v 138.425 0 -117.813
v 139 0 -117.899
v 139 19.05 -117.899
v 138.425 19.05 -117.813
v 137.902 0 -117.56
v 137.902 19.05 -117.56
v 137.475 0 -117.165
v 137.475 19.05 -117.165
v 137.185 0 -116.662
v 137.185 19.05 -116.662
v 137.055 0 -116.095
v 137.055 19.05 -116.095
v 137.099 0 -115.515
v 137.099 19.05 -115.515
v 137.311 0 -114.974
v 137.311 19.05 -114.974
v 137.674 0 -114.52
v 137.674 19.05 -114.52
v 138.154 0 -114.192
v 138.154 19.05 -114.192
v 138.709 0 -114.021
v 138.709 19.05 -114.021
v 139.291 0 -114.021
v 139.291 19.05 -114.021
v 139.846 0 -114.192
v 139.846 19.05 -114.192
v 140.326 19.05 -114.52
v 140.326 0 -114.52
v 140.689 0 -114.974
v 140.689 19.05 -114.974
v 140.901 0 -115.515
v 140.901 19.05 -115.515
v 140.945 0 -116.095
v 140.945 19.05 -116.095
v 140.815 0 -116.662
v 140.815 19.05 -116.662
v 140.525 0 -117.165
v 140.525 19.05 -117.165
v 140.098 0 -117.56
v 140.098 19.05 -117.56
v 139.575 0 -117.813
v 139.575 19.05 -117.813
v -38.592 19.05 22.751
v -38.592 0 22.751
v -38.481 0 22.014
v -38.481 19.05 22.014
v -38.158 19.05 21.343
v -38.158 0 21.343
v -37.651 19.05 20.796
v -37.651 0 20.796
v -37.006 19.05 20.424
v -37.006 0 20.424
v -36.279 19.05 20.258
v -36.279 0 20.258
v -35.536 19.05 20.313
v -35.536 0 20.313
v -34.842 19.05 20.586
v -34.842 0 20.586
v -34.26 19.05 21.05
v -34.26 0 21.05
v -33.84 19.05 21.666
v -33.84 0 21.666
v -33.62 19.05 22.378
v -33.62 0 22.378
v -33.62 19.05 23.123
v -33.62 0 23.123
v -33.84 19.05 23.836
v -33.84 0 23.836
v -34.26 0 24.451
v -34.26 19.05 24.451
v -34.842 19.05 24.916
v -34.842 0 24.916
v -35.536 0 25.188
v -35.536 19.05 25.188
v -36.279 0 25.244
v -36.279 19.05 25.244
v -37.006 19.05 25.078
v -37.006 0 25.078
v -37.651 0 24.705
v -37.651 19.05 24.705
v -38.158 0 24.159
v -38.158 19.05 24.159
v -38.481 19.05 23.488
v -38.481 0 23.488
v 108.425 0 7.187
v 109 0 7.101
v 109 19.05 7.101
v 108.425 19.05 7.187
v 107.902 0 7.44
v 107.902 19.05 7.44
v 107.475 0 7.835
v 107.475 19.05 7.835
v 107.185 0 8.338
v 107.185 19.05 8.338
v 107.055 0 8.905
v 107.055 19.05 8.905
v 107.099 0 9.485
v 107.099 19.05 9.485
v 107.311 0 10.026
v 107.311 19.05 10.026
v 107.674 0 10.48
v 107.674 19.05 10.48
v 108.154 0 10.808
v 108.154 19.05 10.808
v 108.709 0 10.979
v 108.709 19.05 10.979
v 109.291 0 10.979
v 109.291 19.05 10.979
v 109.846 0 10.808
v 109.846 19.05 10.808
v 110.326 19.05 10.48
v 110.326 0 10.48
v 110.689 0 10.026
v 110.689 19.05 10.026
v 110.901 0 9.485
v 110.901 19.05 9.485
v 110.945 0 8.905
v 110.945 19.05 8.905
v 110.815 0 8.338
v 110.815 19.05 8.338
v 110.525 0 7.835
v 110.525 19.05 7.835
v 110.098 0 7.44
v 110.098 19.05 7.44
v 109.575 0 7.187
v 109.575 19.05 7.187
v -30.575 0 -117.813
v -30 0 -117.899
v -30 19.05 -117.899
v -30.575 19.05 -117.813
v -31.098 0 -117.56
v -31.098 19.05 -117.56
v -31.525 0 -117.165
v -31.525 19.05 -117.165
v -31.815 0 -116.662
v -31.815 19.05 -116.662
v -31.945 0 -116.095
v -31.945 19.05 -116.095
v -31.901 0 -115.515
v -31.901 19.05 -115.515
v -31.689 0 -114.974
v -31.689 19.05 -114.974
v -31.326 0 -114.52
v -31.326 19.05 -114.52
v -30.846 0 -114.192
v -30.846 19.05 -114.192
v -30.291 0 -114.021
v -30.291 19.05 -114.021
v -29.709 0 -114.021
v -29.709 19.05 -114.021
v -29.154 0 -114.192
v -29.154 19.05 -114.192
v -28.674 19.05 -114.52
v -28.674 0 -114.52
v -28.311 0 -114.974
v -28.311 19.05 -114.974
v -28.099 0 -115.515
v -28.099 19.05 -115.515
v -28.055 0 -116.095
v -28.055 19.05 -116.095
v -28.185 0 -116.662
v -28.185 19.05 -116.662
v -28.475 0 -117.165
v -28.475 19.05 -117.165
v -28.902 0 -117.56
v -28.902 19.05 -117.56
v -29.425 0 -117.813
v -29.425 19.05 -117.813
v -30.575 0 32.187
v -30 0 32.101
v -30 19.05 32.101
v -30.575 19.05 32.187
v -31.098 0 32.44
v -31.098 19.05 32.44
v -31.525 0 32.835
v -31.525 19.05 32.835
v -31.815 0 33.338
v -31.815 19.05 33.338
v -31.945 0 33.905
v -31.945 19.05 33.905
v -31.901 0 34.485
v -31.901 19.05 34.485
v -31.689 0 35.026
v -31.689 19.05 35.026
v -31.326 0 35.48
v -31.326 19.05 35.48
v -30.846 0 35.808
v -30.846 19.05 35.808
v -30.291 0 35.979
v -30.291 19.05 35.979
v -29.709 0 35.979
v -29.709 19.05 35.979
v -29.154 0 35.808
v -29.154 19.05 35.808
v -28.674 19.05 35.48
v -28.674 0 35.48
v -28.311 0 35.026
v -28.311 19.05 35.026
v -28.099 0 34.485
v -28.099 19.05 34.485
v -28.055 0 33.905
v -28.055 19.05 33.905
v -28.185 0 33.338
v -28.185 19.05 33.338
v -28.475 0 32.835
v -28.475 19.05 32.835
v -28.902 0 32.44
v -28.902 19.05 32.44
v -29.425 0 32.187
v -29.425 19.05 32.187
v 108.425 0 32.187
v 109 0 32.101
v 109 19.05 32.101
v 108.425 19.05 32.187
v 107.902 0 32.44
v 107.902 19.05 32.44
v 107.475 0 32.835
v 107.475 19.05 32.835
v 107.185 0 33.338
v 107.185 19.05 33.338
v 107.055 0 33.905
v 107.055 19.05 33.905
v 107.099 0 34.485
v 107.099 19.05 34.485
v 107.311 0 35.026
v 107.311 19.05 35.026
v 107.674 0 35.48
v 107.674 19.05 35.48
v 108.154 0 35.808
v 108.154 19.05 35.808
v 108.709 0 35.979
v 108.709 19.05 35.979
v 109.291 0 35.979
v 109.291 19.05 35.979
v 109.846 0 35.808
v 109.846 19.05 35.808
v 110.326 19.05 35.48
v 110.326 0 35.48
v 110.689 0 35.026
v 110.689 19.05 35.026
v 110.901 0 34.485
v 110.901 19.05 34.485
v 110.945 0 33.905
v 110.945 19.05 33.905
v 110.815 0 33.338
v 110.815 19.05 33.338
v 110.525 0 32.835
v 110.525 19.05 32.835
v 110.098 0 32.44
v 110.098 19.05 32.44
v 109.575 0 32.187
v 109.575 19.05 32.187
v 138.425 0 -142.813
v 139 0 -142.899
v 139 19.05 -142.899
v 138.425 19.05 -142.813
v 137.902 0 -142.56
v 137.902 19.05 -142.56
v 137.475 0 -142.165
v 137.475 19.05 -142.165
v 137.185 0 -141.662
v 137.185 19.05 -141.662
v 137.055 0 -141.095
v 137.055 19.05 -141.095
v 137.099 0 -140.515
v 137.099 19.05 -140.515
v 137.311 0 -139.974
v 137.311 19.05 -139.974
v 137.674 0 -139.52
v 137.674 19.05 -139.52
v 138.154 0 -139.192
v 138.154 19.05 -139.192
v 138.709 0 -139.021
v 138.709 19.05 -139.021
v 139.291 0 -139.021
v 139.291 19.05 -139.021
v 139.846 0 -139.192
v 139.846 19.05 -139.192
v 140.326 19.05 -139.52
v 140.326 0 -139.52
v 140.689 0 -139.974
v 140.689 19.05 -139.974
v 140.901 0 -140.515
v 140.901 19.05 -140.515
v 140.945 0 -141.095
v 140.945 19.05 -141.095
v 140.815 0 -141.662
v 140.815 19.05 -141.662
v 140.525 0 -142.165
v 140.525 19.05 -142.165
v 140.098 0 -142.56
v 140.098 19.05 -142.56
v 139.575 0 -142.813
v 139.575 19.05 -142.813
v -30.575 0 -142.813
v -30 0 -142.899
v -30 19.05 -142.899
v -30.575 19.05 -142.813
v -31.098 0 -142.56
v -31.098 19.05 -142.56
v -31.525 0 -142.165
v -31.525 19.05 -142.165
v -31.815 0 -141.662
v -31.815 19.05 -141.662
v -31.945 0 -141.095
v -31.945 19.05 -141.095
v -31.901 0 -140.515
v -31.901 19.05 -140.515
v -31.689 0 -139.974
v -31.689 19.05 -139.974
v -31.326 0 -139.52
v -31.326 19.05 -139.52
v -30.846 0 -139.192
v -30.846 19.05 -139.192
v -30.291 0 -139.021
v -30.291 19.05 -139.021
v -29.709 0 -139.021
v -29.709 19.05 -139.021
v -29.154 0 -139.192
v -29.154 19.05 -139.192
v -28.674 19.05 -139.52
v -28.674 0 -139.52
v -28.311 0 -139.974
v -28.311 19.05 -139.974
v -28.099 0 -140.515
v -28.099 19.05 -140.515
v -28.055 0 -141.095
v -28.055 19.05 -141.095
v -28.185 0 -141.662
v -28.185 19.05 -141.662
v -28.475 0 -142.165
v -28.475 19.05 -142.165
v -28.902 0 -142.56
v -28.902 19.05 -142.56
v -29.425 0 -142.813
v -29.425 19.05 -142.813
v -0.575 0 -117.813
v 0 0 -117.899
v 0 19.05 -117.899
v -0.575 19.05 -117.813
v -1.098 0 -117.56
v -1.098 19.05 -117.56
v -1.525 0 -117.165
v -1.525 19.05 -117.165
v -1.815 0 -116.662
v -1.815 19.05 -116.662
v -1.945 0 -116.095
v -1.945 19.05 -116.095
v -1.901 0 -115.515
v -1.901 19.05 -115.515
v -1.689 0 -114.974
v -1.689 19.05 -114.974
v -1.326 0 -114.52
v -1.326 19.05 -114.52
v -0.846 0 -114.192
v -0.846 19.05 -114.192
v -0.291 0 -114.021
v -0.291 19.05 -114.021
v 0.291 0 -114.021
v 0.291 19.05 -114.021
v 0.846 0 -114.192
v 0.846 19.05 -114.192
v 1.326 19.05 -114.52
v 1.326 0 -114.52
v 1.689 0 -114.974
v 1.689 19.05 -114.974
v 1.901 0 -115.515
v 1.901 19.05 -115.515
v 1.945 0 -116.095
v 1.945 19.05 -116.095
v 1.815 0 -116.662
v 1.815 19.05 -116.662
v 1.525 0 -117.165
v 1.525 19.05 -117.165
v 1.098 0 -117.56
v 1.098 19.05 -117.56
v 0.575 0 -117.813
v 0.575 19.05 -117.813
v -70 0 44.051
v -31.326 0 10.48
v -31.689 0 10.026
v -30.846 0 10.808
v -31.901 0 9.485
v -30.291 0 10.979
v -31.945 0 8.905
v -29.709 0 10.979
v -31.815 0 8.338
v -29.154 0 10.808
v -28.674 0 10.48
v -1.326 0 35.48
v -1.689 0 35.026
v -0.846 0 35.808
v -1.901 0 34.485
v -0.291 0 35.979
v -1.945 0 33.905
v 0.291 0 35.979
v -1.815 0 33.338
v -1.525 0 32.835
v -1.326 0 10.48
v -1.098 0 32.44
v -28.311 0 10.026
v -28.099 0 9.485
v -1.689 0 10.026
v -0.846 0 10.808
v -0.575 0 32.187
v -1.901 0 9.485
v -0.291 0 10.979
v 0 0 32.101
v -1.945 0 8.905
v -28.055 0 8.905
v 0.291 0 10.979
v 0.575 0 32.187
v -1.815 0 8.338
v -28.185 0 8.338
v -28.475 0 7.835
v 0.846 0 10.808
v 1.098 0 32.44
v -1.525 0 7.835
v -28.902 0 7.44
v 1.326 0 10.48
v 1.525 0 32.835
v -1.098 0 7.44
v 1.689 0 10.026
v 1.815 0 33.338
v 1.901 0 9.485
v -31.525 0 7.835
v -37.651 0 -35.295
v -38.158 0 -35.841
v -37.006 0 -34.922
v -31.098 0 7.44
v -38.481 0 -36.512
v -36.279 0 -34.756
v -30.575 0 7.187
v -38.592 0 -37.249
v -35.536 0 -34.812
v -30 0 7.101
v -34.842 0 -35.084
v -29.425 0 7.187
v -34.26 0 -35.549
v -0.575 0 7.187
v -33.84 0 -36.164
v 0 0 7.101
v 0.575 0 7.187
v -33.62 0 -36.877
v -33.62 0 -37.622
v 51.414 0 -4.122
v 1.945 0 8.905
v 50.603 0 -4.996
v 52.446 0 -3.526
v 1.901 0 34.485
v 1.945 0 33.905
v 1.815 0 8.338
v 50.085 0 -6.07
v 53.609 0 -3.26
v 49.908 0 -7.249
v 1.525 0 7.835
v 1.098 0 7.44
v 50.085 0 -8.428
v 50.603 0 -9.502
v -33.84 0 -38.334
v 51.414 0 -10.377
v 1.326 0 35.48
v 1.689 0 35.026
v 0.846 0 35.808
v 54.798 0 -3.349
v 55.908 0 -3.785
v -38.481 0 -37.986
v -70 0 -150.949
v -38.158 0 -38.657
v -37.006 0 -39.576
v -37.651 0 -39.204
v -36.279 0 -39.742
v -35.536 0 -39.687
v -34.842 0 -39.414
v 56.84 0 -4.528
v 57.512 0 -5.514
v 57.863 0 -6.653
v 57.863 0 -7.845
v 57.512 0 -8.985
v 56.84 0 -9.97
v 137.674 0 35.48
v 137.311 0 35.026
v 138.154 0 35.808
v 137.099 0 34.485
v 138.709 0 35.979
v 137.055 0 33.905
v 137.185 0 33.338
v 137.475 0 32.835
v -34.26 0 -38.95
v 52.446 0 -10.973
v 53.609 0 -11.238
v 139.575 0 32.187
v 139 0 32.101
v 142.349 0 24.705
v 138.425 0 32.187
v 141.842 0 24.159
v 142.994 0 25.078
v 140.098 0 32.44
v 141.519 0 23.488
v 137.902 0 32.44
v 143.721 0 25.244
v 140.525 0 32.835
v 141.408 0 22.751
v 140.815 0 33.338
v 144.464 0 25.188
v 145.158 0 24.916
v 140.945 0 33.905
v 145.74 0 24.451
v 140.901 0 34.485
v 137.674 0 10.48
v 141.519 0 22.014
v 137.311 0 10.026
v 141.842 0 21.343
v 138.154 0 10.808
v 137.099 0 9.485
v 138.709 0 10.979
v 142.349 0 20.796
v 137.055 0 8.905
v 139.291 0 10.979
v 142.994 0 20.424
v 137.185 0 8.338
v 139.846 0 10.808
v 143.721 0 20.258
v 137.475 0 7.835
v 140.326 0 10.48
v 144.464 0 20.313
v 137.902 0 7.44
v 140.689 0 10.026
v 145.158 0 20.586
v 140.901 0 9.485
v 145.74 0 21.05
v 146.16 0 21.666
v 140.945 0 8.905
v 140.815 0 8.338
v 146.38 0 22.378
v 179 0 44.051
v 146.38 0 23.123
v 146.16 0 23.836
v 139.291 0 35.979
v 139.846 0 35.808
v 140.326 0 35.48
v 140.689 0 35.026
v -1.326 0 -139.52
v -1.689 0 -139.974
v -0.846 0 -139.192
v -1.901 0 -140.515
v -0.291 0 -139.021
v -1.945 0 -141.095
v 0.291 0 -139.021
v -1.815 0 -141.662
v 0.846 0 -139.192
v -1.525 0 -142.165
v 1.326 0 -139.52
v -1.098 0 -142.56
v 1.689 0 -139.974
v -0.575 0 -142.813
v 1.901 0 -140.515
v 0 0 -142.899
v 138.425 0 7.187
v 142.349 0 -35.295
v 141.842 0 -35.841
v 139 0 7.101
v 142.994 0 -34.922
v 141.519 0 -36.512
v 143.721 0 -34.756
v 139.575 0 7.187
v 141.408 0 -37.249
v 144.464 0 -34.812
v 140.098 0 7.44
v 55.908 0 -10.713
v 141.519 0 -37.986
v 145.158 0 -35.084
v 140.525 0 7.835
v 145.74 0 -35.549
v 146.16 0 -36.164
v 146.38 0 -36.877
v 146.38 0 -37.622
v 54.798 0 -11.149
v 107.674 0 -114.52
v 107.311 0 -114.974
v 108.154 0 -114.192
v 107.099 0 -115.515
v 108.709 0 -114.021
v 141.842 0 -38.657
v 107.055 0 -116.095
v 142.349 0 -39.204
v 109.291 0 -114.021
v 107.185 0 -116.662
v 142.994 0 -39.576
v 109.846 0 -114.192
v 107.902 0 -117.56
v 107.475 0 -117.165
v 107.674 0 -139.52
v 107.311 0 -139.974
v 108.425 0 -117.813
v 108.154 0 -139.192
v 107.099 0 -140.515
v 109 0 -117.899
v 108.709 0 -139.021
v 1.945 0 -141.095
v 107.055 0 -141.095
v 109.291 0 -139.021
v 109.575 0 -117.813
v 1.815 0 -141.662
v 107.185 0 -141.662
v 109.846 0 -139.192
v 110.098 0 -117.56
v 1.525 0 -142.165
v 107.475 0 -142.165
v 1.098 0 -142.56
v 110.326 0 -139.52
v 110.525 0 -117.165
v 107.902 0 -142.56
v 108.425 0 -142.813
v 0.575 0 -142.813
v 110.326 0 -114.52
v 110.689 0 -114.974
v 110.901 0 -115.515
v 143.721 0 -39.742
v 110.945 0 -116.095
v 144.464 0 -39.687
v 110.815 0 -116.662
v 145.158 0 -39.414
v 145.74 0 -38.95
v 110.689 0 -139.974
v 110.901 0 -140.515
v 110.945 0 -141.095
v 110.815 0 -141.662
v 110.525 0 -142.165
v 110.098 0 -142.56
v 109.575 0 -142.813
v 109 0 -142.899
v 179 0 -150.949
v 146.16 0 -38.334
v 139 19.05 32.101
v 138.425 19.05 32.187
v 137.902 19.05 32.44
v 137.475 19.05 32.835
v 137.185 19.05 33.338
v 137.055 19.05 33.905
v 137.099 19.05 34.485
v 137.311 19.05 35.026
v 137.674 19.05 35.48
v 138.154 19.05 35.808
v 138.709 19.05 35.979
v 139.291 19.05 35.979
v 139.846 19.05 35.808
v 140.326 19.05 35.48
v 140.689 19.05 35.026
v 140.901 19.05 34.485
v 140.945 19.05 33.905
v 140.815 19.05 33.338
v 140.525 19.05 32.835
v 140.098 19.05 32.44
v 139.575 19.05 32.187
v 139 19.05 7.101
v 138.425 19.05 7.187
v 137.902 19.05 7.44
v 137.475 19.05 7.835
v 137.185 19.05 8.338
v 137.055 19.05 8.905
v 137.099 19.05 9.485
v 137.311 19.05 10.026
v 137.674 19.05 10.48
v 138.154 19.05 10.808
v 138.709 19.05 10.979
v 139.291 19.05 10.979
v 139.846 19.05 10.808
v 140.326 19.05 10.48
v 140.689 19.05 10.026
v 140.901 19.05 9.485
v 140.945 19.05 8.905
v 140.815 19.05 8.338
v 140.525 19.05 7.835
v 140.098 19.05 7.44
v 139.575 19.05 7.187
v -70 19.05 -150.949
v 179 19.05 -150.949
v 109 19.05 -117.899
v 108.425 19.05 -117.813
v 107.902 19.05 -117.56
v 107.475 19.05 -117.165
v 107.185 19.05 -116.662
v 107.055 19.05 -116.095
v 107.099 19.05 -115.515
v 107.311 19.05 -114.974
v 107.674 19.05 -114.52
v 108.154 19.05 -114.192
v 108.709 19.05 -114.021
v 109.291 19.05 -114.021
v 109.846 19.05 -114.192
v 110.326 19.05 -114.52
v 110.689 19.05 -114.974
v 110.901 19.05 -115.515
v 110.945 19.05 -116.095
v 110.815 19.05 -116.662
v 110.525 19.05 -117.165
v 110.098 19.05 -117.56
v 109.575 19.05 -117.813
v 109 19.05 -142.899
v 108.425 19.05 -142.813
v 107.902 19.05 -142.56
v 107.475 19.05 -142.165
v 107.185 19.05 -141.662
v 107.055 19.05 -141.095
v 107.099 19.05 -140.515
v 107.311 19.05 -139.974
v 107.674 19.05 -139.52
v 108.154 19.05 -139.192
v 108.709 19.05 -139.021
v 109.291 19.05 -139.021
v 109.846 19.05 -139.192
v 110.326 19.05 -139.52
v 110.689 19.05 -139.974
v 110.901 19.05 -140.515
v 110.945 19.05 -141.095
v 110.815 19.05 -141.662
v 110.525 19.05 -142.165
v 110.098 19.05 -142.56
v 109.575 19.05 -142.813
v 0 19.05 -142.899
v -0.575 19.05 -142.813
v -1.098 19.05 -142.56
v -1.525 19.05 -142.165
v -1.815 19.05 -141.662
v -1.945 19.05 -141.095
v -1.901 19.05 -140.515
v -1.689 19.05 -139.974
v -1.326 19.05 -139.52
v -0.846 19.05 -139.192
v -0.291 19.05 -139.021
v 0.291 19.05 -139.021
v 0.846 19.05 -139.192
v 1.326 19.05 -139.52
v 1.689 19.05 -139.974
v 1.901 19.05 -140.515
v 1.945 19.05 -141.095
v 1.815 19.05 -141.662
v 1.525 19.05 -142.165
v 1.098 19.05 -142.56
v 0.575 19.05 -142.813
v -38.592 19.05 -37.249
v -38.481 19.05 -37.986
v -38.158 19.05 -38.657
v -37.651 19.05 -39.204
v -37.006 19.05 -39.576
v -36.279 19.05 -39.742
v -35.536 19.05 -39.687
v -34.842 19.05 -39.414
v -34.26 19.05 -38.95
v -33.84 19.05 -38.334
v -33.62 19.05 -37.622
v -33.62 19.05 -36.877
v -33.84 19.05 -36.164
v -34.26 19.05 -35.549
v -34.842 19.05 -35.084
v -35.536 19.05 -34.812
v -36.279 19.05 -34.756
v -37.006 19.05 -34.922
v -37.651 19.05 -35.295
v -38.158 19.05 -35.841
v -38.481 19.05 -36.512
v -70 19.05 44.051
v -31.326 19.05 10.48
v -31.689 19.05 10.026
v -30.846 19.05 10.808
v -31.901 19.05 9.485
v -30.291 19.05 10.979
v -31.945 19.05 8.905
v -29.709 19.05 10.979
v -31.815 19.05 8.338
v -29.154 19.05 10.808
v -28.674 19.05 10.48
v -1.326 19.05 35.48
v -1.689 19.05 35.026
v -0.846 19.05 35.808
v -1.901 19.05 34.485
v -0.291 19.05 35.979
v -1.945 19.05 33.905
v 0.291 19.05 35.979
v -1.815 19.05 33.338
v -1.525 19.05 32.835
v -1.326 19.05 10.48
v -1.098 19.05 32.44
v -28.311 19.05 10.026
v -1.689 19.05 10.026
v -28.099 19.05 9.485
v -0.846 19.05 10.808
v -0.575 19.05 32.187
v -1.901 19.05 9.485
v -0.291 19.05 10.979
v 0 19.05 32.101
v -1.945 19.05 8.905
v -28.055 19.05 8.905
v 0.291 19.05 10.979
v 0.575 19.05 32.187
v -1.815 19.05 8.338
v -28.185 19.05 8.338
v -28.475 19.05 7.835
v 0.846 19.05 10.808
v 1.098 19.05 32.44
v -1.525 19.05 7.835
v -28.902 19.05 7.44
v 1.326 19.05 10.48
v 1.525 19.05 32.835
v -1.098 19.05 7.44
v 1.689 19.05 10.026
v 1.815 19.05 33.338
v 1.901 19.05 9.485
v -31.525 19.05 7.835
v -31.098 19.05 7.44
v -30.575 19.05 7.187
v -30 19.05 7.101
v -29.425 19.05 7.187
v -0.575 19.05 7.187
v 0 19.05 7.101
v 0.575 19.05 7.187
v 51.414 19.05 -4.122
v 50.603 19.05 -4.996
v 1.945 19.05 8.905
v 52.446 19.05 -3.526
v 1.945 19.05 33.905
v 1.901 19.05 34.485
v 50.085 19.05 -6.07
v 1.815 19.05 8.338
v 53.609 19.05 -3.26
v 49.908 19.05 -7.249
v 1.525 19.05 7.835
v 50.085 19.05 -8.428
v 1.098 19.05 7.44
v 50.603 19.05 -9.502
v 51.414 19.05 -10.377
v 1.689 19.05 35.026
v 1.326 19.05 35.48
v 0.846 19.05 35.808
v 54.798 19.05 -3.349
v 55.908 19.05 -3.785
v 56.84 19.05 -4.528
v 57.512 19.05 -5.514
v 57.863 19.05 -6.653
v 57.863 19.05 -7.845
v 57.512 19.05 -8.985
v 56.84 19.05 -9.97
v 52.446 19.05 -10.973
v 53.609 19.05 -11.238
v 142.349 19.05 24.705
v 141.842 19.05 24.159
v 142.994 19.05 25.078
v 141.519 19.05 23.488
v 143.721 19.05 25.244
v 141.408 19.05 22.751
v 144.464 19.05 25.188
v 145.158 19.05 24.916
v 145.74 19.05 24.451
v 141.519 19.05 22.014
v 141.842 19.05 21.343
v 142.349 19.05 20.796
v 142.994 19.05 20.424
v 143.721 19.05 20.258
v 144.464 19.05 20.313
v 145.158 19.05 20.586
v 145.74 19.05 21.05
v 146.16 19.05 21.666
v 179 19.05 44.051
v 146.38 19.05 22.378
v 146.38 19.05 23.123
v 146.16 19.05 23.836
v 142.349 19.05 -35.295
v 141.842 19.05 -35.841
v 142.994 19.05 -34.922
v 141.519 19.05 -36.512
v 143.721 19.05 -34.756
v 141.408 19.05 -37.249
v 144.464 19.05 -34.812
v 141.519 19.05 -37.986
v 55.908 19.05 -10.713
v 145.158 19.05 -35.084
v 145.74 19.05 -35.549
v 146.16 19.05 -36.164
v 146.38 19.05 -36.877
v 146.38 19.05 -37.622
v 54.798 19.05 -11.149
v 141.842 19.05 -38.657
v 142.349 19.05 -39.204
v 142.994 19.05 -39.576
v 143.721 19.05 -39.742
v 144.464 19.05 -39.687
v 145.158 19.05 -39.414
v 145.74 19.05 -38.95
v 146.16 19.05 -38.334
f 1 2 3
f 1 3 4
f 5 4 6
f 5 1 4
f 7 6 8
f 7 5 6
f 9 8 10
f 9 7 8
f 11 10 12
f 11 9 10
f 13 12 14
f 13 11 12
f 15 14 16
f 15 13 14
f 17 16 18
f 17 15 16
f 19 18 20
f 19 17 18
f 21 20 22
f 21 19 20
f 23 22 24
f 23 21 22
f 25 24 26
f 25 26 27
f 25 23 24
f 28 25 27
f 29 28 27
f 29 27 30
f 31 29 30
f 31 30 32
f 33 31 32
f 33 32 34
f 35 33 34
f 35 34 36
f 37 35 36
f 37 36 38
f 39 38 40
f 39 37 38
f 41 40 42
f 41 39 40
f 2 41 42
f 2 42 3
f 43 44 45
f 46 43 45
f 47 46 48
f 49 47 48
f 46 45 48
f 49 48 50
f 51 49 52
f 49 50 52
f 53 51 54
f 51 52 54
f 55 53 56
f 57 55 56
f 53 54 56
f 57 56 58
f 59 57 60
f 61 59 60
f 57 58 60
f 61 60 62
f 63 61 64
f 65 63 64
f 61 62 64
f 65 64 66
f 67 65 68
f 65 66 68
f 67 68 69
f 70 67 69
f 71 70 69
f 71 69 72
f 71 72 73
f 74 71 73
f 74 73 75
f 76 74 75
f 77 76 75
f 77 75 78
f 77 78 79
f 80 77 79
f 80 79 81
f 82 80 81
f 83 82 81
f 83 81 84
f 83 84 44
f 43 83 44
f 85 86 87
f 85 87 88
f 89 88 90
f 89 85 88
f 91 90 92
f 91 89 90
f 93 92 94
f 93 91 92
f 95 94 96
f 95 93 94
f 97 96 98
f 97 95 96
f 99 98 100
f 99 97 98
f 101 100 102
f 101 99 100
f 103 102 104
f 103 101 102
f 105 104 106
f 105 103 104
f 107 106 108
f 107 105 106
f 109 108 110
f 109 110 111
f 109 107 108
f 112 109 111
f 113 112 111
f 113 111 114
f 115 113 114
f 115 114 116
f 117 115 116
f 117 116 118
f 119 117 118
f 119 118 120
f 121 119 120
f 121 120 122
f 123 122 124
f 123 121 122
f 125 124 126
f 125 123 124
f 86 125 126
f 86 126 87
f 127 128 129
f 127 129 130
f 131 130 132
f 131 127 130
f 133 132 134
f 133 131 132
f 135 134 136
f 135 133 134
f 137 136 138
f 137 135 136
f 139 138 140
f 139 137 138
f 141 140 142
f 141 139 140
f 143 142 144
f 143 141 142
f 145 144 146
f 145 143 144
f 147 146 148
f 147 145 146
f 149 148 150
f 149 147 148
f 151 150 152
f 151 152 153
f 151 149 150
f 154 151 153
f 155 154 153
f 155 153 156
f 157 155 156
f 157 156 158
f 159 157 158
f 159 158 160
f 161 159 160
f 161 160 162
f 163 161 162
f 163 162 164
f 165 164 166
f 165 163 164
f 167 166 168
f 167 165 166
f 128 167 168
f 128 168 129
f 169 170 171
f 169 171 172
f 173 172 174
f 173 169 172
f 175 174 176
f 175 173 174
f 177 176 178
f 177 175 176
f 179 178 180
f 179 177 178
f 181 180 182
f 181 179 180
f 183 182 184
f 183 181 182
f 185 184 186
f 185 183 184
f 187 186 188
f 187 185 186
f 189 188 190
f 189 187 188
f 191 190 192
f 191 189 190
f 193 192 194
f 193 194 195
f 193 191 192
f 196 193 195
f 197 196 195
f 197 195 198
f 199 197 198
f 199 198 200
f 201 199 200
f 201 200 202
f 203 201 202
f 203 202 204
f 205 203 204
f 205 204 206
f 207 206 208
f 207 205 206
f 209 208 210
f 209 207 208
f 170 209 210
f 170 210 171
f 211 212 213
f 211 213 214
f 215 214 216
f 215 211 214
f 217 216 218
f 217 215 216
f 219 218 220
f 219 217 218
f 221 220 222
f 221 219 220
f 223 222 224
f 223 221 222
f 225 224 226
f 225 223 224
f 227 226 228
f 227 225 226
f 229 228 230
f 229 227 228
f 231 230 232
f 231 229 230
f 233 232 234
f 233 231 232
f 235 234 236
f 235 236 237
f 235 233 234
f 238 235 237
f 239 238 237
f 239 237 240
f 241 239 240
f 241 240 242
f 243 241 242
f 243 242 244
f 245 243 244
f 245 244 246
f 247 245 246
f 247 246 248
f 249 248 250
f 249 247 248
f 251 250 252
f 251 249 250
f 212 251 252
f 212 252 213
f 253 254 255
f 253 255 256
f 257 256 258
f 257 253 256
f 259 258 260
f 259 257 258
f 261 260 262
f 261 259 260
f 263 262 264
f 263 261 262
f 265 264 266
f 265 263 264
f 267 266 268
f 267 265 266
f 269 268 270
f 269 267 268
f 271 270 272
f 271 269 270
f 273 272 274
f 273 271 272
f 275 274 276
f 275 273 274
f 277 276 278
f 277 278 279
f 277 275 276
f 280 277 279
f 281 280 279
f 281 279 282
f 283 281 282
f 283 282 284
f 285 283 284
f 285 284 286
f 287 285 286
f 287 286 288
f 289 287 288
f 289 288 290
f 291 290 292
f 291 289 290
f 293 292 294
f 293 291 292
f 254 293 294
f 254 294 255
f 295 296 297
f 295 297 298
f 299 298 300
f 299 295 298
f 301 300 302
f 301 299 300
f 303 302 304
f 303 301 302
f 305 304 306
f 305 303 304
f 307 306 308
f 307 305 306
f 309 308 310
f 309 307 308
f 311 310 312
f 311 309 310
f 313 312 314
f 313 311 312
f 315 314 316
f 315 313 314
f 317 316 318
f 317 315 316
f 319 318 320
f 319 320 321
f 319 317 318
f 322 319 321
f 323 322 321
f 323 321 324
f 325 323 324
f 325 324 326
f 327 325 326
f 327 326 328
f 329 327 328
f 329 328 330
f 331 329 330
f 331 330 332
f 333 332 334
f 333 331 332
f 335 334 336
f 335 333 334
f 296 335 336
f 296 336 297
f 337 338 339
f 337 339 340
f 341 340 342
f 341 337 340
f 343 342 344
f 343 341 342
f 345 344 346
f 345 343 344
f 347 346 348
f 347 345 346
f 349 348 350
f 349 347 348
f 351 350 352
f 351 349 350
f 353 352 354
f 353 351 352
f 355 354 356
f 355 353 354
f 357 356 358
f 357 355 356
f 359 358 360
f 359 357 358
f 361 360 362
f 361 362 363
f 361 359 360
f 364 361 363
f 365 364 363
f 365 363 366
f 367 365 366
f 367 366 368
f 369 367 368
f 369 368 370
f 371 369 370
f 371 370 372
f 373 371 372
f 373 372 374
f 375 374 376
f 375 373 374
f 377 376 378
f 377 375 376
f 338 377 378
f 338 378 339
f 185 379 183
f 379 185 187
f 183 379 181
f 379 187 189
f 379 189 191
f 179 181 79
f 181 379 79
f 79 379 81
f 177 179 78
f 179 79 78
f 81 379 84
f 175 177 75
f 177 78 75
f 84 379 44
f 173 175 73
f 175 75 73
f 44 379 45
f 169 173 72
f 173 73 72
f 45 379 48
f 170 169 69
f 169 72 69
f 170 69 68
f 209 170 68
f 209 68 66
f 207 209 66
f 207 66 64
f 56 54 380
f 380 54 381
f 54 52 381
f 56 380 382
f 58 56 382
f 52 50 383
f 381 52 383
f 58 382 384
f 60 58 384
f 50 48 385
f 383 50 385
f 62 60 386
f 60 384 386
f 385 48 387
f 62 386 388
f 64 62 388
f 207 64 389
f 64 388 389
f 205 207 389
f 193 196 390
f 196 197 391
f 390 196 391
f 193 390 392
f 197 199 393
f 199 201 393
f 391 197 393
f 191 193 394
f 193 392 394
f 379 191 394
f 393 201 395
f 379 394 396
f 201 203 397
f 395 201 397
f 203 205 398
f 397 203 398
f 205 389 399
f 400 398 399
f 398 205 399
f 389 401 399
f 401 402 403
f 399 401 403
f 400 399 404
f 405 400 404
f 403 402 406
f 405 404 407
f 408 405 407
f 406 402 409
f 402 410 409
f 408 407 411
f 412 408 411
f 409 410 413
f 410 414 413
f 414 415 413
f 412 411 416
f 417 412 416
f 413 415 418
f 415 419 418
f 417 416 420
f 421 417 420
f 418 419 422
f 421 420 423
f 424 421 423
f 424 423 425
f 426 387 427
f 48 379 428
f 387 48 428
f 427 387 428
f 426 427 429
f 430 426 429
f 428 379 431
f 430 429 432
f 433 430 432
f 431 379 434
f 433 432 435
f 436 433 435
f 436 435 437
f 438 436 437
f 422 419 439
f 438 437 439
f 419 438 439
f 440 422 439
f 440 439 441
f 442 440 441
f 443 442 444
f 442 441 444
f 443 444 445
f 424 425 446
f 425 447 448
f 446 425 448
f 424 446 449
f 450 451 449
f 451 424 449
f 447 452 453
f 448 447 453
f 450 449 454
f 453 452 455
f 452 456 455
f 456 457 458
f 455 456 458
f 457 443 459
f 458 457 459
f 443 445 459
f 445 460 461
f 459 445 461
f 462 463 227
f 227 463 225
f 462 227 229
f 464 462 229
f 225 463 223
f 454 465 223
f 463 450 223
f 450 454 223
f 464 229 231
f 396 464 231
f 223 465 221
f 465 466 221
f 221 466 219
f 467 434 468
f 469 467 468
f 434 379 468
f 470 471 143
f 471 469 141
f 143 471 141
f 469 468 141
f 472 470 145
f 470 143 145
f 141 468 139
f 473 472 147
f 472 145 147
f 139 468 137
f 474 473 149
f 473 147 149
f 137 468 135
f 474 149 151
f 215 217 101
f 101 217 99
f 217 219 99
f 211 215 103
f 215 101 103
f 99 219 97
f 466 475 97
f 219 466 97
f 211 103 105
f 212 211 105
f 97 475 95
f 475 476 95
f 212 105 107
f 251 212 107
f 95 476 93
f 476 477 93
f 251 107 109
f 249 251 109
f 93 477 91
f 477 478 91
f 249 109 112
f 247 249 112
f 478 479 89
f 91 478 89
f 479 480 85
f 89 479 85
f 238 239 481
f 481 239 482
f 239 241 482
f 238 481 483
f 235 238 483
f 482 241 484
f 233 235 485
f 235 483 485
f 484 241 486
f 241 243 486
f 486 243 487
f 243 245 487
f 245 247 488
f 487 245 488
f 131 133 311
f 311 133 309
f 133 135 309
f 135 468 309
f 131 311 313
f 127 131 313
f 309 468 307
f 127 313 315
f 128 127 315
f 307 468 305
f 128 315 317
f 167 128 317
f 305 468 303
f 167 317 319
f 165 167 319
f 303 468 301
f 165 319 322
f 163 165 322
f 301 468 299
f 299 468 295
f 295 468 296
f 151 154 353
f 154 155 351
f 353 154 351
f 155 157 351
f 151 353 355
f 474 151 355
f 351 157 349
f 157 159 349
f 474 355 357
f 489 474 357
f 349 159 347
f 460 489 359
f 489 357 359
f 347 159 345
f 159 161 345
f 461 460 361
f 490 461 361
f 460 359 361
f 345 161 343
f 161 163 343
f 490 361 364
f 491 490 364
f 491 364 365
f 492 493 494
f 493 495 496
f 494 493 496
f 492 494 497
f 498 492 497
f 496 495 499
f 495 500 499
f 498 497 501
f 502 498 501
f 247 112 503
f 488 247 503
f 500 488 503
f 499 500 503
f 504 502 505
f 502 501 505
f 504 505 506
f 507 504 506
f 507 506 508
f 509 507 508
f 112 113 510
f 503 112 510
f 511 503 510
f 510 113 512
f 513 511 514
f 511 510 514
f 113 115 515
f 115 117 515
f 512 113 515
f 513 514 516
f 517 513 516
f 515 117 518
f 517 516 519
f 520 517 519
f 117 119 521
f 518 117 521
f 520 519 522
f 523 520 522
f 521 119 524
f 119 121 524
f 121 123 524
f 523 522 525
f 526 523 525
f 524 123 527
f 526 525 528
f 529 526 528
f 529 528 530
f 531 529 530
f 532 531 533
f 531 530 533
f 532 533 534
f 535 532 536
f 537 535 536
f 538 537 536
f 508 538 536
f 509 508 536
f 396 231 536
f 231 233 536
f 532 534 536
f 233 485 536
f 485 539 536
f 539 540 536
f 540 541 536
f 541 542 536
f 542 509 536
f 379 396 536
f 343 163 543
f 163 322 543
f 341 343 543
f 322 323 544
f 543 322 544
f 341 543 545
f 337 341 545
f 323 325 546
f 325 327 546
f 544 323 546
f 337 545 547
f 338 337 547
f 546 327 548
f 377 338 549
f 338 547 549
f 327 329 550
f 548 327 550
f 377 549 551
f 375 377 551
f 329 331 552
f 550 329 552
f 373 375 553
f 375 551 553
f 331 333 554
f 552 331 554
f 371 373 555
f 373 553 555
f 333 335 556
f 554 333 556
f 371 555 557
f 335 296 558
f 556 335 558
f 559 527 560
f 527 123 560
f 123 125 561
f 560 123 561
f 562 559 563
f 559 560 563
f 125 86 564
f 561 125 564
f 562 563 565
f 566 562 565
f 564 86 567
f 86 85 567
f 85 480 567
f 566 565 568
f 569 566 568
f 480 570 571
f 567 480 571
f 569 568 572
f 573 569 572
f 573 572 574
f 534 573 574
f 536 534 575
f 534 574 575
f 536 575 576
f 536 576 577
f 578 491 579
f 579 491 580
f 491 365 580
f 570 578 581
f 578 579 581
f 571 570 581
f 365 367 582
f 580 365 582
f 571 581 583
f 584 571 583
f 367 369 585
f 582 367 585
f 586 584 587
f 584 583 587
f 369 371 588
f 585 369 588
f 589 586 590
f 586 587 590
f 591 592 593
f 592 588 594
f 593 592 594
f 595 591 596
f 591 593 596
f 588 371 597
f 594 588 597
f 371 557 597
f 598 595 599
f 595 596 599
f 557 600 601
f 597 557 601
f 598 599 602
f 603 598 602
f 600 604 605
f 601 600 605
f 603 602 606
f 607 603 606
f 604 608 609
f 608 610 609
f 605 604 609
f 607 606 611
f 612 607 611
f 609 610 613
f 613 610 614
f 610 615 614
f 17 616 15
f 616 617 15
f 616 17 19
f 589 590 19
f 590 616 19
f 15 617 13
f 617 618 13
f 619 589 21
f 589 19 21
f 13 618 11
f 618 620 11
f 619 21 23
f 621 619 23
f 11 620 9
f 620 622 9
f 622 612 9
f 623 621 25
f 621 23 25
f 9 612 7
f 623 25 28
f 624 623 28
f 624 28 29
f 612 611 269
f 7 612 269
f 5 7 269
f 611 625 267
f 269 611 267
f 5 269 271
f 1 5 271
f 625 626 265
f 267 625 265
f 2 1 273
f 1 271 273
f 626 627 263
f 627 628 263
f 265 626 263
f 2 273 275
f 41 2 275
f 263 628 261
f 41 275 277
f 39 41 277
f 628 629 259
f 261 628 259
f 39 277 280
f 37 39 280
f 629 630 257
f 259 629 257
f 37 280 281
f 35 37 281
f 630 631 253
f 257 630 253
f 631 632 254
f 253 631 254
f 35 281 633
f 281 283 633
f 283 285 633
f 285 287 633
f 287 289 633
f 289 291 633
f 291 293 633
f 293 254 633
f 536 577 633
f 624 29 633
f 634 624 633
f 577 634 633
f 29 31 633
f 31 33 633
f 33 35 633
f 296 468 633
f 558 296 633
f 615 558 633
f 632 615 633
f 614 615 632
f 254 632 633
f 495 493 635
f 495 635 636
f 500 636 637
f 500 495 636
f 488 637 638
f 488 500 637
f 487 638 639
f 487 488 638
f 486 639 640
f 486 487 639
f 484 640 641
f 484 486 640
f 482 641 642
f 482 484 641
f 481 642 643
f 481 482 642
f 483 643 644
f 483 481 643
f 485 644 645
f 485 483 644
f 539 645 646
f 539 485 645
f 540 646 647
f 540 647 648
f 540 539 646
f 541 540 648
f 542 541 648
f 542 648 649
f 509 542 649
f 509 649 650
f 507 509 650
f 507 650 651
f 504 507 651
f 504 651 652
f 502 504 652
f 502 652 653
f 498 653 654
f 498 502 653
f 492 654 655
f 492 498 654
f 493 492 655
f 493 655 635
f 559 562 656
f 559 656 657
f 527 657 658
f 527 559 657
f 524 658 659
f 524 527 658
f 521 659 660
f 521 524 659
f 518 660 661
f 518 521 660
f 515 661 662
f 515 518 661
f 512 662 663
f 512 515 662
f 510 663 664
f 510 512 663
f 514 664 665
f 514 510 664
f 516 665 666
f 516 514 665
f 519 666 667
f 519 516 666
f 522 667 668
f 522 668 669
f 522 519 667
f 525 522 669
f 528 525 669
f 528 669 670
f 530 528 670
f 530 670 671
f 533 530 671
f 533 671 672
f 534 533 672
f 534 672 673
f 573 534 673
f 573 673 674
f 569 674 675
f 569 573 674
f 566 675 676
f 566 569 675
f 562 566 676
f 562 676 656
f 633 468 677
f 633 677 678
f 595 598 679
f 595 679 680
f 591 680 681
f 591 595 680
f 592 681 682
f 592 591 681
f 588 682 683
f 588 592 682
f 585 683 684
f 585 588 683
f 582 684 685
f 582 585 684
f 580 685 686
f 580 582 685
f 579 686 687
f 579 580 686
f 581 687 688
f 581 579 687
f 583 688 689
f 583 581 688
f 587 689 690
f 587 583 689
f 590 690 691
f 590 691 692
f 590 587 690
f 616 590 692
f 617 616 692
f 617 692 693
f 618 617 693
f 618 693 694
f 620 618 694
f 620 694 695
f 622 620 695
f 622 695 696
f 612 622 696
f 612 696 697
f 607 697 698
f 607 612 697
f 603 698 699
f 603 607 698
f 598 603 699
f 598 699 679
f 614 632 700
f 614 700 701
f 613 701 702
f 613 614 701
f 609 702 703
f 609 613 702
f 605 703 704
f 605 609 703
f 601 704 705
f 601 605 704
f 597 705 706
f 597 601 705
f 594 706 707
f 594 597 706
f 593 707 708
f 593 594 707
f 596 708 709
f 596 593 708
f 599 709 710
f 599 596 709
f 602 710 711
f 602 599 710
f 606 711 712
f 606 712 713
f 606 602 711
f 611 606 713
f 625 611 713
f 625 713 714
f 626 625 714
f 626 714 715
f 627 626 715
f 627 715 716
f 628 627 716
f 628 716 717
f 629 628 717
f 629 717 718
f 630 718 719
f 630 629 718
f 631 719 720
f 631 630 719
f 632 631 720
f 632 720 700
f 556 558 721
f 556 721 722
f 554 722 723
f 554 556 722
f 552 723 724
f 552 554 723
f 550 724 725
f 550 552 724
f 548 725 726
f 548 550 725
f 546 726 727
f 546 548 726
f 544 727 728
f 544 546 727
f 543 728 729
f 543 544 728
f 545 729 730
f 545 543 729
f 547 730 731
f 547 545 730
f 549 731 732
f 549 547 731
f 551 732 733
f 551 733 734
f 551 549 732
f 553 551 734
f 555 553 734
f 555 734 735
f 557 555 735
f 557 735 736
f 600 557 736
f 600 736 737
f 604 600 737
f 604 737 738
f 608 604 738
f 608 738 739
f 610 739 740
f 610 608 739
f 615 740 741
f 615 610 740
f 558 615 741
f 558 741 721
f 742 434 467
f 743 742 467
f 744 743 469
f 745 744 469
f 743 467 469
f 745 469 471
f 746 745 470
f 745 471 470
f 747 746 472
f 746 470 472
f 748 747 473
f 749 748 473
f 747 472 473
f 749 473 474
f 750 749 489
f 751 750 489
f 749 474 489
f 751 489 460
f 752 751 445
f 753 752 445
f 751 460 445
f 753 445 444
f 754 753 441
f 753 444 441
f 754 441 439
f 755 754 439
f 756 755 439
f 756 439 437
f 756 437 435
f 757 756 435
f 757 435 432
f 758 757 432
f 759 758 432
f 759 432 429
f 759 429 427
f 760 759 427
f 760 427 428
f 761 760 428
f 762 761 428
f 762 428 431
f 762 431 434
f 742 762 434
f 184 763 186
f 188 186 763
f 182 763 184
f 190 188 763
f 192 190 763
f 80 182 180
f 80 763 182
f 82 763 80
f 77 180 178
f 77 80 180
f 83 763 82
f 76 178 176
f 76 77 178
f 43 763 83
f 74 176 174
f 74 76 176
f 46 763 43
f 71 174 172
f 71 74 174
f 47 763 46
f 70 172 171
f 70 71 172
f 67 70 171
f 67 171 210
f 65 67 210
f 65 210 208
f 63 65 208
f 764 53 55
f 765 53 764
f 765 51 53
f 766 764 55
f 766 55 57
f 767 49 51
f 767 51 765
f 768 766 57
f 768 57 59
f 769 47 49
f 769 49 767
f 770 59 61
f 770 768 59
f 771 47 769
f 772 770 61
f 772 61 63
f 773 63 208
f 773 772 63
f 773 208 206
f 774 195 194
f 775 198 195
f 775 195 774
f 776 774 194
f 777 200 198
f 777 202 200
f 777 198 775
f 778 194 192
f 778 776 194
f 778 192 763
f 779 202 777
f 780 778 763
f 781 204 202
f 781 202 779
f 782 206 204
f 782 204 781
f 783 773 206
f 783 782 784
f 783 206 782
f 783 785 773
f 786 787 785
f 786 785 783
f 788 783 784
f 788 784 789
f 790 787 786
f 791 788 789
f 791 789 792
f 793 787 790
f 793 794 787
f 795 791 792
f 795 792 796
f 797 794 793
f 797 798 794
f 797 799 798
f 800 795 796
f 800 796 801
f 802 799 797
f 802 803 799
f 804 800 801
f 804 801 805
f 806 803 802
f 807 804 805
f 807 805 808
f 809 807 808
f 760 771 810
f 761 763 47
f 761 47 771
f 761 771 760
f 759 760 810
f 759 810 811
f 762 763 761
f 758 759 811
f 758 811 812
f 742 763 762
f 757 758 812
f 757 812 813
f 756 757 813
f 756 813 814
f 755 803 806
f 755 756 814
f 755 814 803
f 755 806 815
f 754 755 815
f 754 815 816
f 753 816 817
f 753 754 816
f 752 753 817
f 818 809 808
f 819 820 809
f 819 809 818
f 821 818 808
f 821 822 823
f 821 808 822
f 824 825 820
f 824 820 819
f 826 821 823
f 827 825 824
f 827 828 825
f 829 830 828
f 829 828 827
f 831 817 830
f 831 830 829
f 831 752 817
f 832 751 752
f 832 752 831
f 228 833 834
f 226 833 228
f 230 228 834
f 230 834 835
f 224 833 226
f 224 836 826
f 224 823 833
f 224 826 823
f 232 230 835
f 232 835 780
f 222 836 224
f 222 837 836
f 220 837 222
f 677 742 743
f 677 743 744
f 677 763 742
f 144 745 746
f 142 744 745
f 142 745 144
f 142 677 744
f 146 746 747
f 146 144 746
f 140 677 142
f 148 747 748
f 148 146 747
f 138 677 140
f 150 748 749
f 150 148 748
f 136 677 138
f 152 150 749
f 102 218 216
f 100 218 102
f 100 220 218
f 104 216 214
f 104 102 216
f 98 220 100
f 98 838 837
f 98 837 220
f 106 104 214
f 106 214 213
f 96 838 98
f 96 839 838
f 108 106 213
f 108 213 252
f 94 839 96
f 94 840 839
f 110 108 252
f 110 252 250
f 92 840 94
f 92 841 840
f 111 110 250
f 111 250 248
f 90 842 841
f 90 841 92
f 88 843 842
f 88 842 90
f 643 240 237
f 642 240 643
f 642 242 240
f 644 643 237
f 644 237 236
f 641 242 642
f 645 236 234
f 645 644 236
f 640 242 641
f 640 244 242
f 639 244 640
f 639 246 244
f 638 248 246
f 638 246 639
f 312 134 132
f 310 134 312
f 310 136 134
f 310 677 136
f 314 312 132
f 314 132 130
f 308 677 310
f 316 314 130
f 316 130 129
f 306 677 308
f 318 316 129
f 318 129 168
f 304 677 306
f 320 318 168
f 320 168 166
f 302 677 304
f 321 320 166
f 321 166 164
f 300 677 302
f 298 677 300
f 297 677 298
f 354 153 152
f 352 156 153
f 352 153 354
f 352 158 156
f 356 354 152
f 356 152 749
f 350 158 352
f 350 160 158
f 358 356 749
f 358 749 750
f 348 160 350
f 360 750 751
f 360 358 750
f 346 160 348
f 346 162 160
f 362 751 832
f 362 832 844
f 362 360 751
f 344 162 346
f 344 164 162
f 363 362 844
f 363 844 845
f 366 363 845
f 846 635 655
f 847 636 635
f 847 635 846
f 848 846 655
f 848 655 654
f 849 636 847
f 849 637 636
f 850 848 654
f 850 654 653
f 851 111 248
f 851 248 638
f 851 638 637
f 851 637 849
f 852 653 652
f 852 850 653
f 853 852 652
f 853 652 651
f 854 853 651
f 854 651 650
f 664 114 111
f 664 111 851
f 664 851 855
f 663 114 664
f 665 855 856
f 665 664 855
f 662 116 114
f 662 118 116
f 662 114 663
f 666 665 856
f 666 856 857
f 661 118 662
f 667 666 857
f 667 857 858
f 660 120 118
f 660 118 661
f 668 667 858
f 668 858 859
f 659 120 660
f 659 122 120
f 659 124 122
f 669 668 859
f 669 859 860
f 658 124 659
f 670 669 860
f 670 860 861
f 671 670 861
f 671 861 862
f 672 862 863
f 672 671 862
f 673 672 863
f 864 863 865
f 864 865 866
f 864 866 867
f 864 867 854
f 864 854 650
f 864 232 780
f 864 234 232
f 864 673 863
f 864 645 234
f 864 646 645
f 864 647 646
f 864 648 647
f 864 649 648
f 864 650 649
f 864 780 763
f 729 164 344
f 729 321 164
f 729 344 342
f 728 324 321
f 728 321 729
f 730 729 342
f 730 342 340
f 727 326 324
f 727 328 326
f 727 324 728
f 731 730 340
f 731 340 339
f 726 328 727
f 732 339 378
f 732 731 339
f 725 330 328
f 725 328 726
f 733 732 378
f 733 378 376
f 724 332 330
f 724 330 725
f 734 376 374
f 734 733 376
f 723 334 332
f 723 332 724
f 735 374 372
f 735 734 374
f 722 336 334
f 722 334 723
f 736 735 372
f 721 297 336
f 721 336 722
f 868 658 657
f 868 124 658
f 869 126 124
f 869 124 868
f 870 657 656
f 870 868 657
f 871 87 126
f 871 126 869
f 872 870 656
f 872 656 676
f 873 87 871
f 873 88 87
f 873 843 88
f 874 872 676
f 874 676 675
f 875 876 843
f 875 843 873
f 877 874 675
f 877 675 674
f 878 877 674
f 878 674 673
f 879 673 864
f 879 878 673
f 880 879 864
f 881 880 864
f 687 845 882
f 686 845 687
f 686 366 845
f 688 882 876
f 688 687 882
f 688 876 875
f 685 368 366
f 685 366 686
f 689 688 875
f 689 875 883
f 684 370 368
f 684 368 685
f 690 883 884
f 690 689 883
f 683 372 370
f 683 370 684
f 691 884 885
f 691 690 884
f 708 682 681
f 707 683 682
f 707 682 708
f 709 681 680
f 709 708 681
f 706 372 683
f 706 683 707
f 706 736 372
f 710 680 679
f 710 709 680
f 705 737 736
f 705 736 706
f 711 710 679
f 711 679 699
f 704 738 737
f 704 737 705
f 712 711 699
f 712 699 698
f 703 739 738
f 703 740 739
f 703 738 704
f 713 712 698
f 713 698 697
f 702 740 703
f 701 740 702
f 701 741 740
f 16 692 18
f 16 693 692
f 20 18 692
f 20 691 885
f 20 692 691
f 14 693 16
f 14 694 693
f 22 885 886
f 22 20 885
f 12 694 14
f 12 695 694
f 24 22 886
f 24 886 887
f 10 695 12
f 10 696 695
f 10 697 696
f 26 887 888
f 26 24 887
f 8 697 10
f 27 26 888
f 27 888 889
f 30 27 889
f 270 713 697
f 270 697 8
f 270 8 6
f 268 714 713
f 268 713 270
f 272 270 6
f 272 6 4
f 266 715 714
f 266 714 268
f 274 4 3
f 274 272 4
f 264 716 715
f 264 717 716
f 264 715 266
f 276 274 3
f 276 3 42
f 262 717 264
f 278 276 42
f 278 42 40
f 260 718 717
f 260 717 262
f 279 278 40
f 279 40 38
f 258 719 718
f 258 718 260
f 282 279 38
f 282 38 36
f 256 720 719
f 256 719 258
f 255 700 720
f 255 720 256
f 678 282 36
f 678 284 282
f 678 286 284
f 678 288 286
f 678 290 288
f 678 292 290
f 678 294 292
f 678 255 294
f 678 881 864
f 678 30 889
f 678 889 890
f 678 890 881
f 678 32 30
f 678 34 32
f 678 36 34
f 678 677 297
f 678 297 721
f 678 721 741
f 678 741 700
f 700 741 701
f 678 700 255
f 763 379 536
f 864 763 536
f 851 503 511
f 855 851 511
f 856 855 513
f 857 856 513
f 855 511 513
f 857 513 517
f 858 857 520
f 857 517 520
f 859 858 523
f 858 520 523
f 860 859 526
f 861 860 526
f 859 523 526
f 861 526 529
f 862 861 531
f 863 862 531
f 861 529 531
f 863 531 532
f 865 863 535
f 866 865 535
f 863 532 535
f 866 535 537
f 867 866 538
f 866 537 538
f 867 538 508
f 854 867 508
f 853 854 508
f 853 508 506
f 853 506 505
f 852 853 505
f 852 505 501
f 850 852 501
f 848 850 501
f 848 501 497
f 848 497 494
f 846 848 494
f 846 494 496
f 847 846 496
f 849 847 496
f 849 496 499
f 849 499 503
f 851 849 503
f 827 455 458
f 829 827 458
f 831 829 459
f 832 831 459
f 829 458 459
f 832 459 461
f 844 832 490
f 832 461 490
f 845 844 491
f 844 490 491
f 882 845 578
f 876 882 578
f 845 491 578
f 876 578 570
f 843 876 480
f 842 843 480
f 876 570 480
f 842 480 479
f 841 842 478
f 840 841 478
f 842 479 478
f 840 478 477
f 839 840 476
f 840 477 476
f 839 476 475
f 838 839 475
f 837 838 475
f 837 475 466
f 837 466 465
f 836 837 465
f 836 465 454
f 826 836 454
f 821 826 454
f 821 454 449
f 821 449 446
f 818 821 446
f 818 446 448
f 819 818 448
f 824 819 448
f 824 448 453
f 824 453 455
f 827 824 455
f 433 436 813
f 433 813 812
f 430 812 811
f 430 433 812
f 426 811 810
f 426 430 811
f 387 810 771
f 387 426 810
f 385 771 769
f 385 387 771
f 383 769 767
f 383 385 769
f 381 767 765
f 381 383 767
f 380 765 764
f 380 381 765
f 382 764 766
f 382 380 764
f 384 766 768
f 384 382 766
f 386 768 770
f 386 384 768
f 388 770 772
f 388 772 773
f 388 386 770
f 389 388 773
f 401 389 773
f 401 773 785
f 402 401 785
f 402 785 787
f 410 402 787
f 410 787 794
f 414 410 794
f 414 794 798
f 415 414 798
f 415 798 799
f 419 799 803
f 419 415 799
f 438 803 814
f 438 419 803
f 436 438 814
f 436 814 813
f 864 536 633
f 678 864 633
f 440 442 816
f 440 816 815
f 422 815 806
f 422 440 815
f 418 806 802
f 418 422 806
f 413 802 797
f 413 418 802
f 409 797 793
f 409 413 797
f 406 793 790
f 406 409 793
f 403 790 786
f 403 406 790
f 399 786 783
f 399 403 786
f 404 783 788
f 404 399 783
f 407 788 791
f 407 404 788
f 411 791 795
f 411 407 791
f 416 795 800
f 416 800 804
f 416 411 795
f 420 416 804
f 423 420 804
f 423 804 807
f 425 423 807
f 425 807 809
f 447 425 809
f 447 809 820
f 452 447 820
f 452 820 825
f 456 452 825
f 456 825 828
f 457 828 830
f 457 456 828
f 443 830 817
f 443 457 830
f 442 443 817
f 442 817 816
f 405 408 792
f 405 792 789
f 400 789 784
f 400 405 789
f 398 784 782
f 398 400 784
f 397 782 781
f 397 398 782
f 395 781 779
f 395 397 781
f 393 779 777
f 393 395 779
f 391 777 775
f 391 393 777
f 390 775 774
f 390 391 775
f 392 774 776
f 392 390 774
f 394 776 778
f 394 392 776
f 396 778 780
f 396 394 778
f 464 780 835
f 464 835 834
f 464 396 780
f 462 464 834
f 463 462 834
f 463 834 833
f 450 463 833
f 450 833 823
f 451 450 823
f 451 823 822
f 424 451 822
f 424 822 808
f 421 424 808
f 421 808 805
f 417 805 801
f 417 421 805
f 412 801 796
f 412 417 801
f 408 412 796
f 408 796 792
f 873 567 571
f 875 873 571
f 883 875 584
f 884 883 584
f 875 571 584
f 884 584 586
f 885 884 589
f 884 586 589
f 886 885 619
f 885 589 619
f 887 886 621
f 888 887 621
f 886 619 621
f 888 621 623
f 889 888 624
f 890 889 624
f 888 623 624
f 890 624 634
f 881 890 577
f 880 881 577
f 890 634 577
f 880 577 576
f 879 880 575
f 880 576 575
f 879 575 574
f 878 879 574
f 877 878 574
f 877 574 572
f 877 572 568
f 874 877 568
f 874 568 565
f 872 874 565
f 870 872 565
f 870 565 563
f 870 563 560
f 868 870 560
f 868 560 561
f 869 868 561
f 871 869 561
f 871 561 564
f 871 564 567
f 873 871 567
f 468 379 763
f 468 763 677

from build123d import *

# Parameters (mm, degrees)
SKETCH1_W             = 249
SKETCH1_H             = 195
SKETCH1_R             = 1.95
BOSS_EXTRUDE1_DEPTH   = 19.05
M6X1_0_TAPPED_HOLE1_D = 5
F_8_0MM_DOWEL_HOLE1_D = 8


with BuildPart() as part:
    # Sketch1 → Boss-Extrude1 (new body)
    with BuildSketch(Plane(origin=(0, 0, 0), x_dir=(1, 0, 0), z_dir=(0, 1, 0))):
        with Locations((54.5, 53.449182879)):
            Rectangle(SKETCH1_W, SKETCH1_H)
        with Locations(Location((-30, -9.050817121, 0), (0, 0, 90))):
            Circle(SKETCH1_R, mode=Mode.SUBTRACT)
        with Locations(Location((0, -9.050817121, 0), (0, 0, 90))):
            Circle(SKETCH1_R, mode=Mode.SUBTRACT)
        with Locations(Location((0, -34.050817121, 0), (0, 0, 90))):
            Circle(SKETCH1_R, mode=Mode.SUBTRACT)
        with Locations(Location((-30, -34.050817121, 0), (0, 0, 90))):
            Circle(SKETCH1_R, mode=Mode.SUBTRACT)
        with Locations(Location((109, -34.050817121, 0), (0, 0, 90))):
            Circle(SKETCH1_R, mode=Mode.SUBTRACT)
        with Locations(Location((109, -9.050817121, 0), (0, 0, 90))):
            Circle(SKETCH1_R, mode=Mode.SUBTRACT)
        with Locations(Location((139, -9.050817121, 0), (0, 0, 90))):
            Circle(SKETCH1_R, mode=Mode.SUBTRACT)
        with Locations(Location((139, -34.050817121, 0), (0, 0, 90))):
            Circle(SKETCH1_R, mode=Mode.SUBTRACT)
        with Locations(Location((109, 115.949182879, 0), (0, 0, 90))):
            Circle(SKETCH1_R, mode=Mode.SUBTRACT)
        with Locations(Location((109, 140.949182879, 0), (0, 0, 90))):
            Circle(SKETCH1_R, mode=Mode.SUBTRACT)
        with Locations(Location((139, 140.949182879, 0), (0, 0, 90))):
            Circle(SKETCH1_R, mode=Mode.SUBTRACT)
        with Locations(Location((139, 115.949182879, 0), (0, 0, 90))):
            Circle(SKETCH1_R, mode=Mode.SUBTRACT)
        with Locations(Location((-30, 115.949182879, 0), (0, 0, 90))):
            Circle(SKETCH1_R, mode=Mode.SUBTRACT)
        with Locations(Location((-30, 140.949182879, 0), (0, 0, 90))):
            Circle(SKETCH1_R, mode=Mode.SUBTRACT)
        with Locations(Location((0, 140.949182879, 0), (0, 0, 90))):
            Circle(SKETCH1_R, mode=Mode.SUBTRACT)
        with Locations(Location((0, 115.949182879, 0), (0, 0, 90))):
            Circle(SKETCH1_R, mode=Mode.SUBTRACT)
    extrude(amount=BOSS_EXTRUDE1_DEPTH)

    # M6x1.0 Tapped Hole1 (through all)
    with Locations(Plane(origin=(0, 19.05, 0), x_dir=(1, 0, 0), z_dir=(0, 1, 0))):
        with Locations((-36.092306809, 37.249182879), (143.907693191, 37.249182879), (143.907693191, -22.750817121), (-36.092306809, -22.750817121)):
            Hole(M6X1_0_TAPPED_HOLE1_D / 2)

    # Ø8.0mm Dowel Hole1 (through all)
    with Locations(Plane(origin=(0, 19.05, 0), x_dir=(1, 0, 0), z_dir=(0, 1, 0))):
        with Locations((53.907693191, 7.249182879)):
            Hole(F_8_0MM_DOWEL_HOLE1_D / 2)


solid = part.part
